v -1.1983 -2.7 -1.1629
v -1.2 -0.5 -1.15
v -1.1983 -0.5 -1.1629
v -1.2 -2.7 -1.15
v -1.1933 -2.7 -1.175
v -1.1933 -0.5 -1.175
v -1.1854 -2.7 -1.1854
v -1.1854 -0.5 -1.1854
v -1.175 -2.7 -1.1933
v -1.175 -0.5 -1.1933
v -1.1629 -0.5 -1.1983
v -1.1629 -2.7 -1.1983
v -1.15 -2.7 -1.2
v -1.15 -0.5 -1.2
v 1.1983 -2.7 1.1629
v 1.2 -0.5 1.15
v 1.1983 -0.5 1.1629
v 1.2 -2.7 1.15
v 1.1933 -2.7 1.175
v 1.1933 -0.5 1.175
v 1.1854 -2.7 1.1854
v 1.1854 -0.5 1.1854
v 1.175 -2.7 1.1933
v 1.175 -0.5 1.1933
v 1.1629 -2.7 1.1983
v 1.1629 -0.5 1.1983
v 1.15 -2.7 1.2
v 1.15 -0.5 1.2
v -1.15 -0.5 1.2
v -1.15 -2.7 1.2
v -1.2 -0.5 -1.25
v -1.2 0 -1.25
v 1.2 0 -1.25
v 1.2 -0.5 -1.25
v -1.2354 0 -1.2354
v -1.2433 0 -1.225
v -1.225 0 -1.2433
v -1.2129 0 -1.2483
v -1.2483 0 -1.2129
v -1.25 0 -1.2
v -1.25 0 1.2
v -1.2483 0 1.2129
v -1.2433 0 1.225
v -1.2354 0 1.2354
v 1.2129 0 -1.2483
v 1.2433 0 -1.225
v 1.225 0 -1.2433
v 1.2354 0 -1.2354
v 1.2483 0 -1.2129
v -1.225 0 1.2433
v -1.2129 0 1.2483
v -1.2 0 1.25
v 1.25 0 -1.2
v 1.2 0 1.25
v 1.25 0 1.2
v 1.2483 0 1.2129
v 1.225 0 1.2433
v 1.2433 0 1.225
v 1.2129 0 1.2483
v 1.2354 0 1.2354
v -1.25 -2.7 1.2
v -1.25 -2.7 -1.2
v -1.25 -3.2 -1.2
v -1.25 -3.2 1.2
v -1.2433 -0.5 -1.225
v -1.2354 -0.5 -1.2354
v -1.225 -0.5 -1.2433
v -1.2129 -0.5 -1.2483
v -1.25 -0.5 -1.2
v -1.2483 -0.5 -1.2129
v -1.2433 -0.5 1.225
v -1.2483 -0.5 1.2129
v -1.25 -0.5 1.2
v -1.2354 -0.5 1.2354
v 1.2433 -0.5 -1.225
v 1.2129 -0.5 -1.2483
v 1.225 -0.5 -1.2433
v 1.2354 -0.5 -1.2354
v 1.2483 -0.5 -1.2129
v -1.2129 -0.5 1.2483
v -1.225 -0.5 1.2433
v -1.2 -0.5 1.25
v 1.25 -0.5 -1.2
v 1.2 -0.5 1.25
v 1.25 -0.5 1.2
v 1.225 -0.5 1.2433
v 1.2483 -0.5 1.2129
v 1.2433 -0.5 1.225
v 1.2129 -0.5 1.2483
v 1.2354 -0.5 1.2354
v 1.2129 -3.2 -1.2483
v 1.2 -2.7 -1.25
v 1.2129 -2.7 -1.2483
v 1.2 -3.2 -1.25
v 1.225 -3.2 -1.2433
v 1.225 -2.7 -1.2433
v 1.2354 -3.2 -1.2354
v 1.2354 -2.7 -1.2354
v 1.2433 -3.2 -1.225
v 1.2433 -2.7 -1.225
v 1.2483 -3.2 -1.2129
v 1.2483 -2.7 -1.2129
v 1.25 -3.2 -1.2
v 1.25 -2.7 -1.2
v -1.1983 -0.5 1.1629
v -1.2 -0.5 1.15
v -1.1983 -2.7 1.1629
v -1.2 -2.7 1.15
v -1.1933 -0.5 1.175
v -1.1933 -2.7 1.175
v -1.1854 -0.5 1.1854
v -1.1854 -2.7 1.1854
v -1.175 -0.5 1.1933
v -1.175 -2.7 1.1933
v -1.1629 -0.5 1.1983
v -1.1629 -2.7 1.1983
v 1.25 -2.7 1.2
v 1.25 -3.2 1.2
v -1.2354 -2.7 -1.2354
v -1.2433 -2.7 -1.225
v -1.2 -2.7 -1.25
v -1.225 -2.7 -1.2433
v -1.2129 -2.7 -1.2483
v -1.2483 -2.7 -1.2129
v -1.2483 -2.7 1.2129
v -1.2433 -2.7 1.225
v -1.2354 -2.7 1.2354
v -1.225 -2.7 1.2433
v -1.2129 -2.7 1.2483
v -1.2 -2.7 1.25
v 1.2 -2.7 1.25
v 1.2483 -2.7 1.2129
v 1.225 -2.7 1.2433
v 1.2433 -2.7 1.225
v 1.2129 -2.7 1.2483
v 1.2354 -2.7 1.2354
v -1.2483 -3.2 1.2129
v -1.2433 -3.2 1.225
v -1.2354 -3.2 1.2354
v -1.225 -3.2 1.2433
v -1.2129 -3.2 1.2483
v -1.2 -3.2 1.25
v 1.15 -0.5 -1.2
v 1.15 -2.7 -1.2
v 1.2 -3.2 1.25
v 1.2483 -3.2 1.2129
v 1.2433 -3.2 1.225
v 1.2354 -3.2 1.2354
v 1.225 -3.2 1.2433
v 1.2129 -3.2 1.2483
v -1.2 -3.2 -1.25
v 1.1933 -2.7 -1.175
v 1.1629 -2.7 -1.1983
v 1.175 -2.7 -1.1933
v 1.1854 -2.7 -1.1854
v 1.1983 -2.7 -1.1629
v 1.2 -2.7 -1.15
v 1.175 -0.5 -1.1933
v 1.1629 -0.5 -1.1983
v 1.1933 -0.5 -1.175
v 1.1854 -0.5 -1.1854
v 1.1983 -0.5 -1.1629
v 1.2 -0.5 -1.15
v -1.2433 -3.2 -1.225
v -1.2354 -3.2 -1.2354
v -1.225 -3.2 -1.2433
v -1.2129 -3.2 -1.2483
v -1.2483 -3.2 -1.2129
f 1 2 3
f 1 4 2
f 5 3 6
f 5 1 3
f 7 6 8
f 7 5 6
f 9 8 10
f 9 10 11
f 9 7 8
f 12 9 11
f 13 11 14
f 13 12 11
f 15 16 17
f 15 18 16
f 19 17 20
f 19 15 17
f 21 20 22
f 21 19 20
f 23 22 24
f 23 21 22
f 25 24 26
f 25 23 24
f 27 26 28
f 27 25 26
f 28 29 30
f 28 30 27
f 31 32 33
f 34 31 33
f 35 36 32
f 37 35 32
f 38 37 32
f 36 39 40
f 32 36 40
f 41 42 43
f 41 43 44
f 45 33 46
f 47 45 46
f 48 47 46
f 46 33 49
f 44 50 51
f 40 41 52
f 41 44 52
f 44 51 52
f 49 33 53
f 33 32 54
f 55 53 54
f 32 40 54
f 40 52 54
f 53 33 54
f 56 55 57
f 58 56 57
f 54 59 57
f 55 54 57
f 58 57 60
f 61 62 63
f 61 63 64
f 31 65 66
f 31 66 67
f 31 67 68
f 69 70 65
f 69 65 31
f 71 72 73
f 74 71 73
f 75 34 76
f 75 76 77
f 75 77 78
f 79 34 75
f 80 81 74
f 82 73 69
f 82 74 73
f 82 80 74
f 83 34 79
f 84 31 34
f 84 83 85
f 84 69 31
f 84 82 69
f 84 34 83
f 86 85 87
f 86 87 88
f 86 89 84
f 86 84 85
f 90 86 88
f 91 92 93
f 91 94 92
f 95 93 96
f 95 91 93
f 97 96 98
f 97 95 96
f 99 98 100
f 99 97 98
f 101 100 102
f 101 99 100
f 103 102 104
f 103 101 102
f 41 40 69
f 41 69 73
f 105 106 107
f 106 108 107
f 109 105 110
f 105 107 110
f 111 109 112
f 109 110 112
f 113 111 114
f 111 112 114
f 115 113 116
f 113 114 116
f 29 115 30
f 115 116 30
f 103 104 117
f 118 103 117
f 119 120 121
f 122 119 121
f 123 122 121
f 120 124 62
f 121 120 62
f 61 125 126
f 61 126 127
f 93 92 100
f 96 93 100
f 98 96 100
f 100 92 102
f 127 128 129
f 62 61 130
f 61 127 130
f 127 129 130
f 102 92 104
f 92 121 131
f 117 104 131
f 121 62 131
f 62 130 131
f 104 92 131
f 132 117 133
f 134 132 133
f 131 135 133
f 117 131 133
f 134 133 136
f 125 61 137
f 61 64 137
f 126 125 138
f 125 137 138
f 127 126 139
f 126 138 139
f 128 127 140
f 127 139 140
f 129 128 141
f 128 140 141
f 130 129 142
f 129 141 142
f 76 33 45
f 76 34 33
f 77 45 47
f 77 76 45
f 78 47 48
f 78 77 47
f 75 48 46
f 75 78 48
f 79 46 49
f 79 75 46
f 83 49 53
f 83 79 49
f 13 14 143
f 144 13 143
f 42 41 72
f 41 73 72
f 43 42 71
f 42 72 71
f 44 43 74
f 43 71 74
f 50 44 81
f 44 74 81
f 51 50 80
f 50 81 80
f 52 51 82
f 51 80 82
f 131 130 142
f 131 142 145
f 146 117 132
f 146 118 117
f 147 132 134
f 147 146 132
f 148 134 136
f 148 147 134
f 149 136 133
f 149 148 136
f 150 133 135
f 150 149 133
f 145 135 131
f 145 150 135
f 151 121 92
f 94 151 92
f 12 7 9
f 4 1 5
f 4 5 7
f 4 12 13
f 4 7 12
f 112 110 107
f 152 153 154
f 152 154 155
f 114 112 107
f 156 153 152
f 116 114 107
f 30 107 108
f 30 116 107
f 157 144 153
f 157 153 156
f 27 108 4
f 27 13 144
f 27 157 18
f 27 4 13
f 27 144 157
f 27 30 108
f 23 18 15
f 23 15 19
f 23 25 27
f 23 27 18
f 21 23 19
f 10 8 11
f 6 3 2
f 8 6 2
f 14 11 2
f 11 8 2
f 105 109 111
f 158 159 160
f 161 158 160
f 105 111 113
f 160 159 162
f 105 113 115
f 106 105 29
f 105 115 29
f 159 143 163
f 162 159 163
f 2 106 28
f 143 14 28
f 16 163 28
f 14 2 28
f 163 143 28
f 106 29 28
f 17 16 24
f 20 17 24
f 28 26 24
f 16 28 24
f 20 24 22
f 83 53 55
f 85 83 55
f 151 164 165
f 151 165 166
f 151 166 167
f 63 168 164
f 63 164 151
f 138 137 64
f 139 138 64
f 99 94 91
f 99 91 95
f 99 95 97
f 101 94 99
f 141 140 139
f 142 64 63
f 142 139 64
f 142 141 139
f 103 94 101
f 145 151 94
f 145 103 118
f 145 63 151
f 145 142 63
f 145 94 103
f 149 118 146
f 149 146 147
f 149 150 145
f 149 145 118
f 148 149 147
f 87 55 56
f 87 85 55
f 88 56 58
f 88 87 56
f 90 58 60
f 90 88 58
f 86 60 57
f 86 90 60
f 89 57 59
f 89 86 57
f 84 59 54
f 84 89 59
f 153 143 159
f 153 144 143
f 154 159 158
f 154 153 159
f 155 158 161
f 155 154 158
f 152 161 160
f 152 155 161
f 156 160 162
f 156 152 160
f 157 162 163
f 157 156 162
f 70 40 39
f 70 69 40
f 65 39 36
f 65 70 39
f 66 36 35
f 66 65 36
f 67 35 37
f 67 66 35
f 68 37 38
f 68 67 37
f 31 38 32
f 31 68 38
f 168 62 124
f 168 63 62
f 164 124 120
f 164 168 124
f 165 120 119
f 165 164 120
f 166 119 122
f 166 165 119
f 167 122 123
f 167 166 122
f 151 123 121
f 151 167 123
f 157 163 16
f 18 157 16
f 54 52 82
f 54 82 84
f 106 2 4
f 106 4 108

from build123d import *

# Parameters (mm, degrees)
F0_W     = 2.5
F0_H     = 2.5
F1_DEPTH = 0.5
F2_W     = 2.4
F2_H     = 2.4
F3_DEPTH = 2.2
F4_W     = 2.5
F4_H     = 2.5
F5_DEPTH = 0.5
F6_R     = 0.05
F6_2_R   = 0.05
F6_3_R   = 0.05


with BuildPart() as f1:
    # F0 (on Front) → F1 (new body)
    with BuildSketch(Plane.XZ):
        Rectangle(F0_W, F0_H)
    extrude(amount=F1_DEPTH)

    # F6#2
    f6_2_edges = [f1.edges().sort_by_distance(p)[0] for p in [
        (1.25, -0.25, 1.25),
        (1.25, -0.25, -1.25),
        (-1.25, -0.25, 1.25),
        (-1.25, -0.25, -1.25),
    ]]
    fillet(f6_2_edges, radius=F6_2_R)


with BuildPart() as f3:
    # F2 (on face) → F3 (new body)
    with BuildSketch(Plane.XZ.offset(0.5)):
        Rectangle(F2_W, F2_H)
    extrude(amount=F3_DEPTH)

    # F6#3
    f6_3_edges = [f3.edges().sort_by_distance(p)[0] for p in [
        (1.2, -1.6, 1.2),
        (-1.2, -1.6, 1.2),
        (1.2, -1.6, -1.2),
        (-1.2, -1.6, -1.2),
    ]]
    fillet(f6_3_edges, radius=F6_3_R)


with BuildPart() as f5:
    # F4 (on face) → F5 (new body)
    with BuildSketch(Plane.XZ.offset(2.7)):
        Rectangle(F4_W, F4_H)
    extrude(amount=F5_DEPTH)

    # F6
    f6_edges = [f5.edges().sort_by_distance(p)[0] for p in [
        (1.25, -2.95, 1.25),
        (1.25, -2.95, -1.25),
        (-1.25, -2.95, 1.25),
        (-1.25, -2.95, -1.25),
    ]]
    fillet(f6_edges, radius=F6_R)


solid = Compound([f1.part, f3.part, f5.part])
